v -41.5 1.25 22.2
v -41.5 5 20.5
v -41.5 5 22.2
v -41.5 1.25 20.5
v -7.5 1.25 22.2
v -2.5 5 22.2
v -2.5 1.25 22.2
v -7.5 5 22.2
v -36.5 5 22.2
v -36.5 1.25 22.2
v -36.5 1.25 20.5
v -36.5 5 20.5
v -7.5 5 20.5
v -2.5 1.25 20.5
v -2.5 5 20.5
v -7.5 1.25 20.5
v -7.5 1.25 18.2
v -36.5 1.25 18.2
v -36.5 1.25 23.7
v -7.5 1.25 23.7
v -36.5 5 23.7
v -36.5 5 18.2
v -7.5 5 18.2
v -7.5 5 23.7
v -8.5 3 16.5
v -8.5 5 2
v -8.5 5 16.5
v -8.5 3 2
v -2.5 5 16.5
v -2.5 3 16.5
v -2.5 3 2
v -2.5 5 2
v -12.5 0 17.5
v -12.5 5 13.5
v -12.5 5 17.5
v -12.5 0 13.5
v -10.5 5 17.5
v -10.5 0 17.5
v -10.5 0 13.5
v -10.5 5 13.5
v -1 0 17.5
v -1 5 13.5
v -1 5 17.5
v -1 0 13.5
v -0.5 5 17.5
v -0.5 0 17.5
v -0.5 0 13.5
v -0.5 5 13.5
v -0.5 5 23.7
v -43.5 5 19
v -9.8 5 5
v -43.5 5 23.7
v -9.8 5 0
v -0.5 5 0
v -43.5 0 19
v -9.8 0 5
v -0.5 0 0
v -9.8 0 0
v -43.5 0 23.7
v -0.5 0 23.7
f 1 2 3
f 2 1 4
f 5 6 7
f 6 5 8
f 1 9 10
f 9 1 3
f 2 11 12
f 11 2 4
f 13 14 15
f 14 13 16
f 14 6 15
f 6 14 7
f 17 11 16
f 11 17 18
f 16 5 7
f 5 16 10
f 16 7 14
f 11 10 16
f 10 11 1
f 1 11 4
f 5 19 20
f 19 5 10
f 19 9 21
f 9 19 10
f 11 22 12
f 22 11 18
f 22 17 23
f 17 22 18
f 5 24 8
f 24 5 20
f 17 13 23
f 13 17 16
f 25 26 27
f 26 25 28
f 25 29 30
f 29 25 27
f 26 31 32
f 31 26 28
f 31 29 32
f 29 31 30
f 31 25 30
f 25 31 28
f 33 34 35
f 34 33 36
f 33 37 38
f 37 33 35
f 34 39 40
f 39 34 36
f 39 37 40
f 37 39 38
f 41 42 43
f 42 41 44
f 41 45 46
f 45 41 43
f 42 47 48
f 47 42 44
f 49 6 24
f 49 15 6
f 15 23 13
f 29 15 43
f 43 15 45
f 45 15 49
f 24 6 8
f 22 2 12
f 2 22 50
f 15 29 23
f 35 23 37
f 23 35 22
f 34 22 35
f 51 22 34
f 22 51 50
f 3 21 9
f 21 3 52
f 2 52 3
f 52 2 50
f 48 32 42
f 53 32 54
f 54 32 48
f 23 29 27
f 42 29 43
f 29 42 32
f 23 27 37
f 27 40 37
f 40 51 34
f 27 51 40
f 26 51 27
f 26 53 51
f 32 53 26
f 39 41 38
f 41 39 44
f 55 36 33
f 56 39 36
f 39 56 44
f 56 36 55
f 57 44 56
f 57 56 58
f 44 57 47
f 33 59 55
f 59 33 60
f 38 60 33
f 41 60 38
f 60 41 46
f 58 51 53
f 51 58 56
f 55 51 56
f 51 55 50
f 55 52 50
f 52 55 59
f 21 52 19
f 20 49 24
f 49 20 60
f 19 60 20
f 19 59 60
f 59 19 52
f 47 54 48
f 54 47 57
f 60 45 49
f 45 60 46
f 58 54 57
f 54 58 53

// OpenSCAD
//difference(){
module parts() {
    translate([2, 1.25, 2]) {
        translate([0, 3.5 / 2, 0]) cube([6, 37.5, 14.5]);
        translate([0, 0, 18.5]) {
            cube([39, 41, 1.7]);
            translate([5, 0, - 2.3]) cube([29, 41, 10]);
        }
        translate([8, - 5, 11.5]) cube([2, 50, 4]);
        translate([- 3.5, - 5, 11.5]) cube([2, 50, 4]);
    }
}


//#cube([1,1,22.2+1.5]);
module reduction() {
    difference() {
        rotate([90, 0]) {
            translate([0, 0, - 5])
                linear_extrude(5) {
                    hull() {
                        translate([0, 19]) square([43, 4.7]);
                        translate([0, 5]) square([9.3, 5]);
                    }
                    square([9.3, 5]);
                }
        }
        parts();
//        translate([- 1, 2.25, 20.5]) cube([50, 10, 10]);
//        #translate([- 1, 2.25, 20.5]) cube([50, 10, 10]);
    }
}
//reduction();

translate([- 0.5, 0])
    mirror([- 1, 0])
        reduction();
